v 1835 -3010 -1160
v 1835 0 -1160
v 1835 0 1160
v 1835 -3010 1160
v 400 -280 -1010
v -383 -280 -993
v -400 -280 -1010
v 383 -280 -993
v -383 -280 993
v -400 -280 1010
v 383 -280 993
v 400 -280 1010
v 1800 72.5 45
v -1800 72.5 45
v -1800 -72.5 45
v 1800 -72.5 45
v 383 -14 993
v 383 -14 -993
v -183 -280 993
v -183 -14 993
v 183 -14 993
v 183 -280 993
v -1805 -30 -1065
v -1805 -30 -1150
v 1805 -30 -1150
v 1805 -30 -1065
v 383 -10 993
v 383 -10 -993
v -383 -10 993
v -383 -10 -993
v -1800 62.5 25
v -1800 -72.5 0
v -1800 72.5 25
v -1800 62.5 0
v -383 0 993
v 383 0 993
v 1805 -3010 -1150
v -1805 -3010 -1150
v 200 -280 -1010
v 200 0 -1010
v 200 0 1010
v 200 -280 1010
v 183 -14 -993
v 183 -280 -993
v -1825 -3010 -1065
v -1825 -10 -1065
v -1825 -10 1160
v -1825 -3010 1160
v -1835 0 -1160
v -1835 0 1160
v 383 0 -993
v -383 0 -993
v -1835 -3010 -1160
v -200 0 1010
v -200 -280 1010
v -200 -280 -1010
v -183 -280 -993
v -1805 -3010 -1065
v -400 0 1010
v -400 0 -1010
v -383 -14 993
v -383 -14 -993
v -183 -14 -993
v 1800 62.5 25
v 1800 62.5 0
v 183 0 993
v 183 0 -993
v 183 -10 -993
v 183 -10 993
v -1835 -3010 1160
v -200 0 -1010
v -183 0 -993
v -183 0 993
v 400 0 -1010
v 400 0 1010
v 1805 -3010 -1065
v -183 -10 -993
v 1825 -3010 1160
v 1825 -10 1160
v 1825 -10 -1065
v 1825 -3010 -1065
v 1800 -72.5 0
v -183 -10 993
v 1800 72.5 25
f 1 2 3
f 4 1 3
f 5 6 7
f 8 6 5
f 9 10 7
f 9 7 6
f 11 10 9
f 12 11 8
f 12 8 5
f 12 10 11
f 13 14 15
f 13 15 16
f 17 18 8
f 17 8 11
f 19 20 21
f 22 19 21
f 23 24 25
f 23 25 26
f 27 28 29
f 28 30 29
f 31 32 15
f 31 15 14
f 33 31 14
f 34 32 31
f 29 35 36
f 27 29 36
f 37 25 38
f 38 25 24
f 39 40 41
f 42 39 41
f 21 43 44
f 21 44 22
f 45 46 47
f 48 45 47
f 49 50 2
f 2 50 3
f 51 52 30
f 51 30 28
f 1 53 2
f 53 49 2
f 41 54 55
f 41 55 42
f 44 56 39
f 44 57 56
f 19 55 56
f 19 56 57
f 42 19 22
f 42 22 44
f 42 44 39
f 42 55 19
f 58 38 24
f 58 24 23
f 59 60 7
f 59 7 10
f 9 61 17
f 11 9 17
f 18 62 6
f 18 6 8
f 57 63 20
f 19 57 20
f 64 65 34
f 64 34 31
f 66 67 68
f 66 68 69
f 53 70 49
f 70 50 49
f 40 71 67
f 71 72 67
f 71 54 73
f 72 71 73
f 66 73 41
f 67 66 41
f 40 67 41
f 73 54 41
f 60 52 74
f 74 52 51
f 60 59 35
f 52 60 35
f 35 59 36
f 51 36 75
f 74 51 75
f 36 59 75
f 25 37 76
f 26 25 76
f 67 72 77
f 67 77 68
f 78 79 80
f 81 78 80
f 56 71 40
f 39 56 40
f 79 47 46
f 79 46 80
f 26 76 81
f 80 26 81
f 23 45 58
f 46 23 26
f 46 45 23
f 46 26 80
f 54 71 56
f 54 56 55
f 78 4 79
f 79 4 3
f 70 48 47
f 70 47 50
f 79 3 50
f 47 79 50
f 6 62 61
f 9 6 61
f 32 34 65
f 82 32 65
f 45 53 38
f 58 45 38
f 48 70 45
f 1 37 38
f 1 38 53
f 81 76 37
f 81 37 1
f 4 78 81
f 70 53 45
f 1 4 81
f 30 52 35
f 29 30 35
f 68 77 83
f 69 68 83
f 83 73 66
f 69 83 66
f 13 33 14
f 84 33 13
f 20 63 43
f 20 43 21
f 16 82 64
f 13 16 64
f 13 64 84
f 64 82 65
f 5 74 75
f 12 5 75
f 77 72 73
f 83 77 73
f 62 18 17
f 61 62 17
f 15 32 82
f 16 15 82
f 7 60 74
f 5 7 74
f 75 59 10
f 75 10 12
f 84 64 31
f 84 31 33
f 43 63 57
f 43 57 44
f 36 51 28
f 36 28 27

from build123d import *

# Parameters (mm, degrees)
F0_W          = 400
F0_H          = 2020
F0_W_2        = 366
F0_H_2        = 1986
F1_DEPTH      = 280
F2_W          = 4
F2_H          = 1986
F3_DEPTH      = 366
F4_W          = 800
F4_H          = 2020
F4_W_2        = 766
F4_H_2        = 1986
F5_DEPTH      = 280
F6_DEPTH      = 566
F6_DEPTH_BACK = 200
F7_W          = 3670
F7_H          = 2320
F8_DEPTH      = 10
F10_DEPTH     = 3000
F11_W         = 20
F11_H         = 85
F12_DEPTH     = 3000
F13_W         = 20
F13_H         = 85
F14_DEPTH     = 3610
F15_W         = 3600
F15_H         = 145
F16_DEPTH     = 45
F17_W         = 10
F17_H         = 25
F18_DEPTH     = 3600


with BuildPart() as f1:
    # F0 (on Front) → F1 (new body)
    with BuildSketch(Plane.XZ):
        Rectangle(F0_W, F0_H)
        Rectangle(F0_W_2, F0_H_2, mode=Mode.SUBTRACT)
    extrude(amount=F1_DEPTH)

    # F2 (on face) → F3 (join, through all)
    with BuildSketch(Plane.YZ.offset(-183)):
        with Locations((-12, 0)):
            Rectangle(F2_W, F2_H)
    extrude(amount=F3_DEPTH)


with BuildPart() as f5:
    # F4 (on Front) → F5 (new body)
    with BuildSketch(Plane.XZ):
        Rectangle(F4_W, F4_H)
        Rectangle(F4_W_2, F4_H_2, mode=Mode.SUBTRACT)
    extrude(amount=F5_DEPTH)

    # F2 (on face) → F6 (join, two sides)
    with BuildSketch(Plane.YZ.offset(-183)) as f6_sk:
        with Locations((-12, 0)):
            Rectangle(F2_W, F2_H)
    extrude(amount=F6_DEPTH)
    extrude(f6_sk.sketch, amount=-F6_DEPTH_BACK)


with BuildPart() as f8:
    # F7 (on Front) → F8 (new body)
    with BuildSketch(Plane.XZ):
        Rectangle(F7_W, F7_H)
    extrude(amount=F8_DEPTH)

    # F9 (on face) → F10 (join)
    with BuildSketch(Plane.XZ.offset(10)):
        Polygon((-1825, 1160), (-1835, 1160), (-1835, -1160), (1835, -1160), (1835, 1160), (1825, 1160), (1825, -1150), (-1825, -1150), align=None)
    extrude(amount=F10_DEPTH)

    # F11 (on face) → F12 (join, through all)
    with BuildSketch(Plane.XZ.offset(3010)):
        with Locations((-1815, -1107.5)):
            Rectangle(F11_W, F11_H)
        with Locations((1815, -1107.5)):
            Rectangle(F11_W, F11_H)
    extrude(amount=-F12_DEPTH)

    # F13 (on face) → F14 (join, through all)
    with BuildSketch(Plane.YZ.offset(-1805)):
        with Locations((-20, -1107.5)):
            Rectangle(F13_W, F13_H)
    extrude(amount=F14_DEPTH)


with BuildPart() as f16:
    # F15 (on Top) → F16 (new body)
    with BuildSketch(Plane.XY):
        Rectangle(F15_W, F15_H)
    extrude(amount=F16_DEPTH)

    # F17 (on face) → F18 (cut, through all)
    with BuildSketch(Plane.YZ.offset(1800)):
        with Locations((67.5, 12.5)):
            Rectangle(F17_W, F17_H)
    extrude(amount=-F18_DEPTH, mode=Mode.SUBTRACT)


solid = Compound([f1.part, f5.part, f8.part, f16.part])
